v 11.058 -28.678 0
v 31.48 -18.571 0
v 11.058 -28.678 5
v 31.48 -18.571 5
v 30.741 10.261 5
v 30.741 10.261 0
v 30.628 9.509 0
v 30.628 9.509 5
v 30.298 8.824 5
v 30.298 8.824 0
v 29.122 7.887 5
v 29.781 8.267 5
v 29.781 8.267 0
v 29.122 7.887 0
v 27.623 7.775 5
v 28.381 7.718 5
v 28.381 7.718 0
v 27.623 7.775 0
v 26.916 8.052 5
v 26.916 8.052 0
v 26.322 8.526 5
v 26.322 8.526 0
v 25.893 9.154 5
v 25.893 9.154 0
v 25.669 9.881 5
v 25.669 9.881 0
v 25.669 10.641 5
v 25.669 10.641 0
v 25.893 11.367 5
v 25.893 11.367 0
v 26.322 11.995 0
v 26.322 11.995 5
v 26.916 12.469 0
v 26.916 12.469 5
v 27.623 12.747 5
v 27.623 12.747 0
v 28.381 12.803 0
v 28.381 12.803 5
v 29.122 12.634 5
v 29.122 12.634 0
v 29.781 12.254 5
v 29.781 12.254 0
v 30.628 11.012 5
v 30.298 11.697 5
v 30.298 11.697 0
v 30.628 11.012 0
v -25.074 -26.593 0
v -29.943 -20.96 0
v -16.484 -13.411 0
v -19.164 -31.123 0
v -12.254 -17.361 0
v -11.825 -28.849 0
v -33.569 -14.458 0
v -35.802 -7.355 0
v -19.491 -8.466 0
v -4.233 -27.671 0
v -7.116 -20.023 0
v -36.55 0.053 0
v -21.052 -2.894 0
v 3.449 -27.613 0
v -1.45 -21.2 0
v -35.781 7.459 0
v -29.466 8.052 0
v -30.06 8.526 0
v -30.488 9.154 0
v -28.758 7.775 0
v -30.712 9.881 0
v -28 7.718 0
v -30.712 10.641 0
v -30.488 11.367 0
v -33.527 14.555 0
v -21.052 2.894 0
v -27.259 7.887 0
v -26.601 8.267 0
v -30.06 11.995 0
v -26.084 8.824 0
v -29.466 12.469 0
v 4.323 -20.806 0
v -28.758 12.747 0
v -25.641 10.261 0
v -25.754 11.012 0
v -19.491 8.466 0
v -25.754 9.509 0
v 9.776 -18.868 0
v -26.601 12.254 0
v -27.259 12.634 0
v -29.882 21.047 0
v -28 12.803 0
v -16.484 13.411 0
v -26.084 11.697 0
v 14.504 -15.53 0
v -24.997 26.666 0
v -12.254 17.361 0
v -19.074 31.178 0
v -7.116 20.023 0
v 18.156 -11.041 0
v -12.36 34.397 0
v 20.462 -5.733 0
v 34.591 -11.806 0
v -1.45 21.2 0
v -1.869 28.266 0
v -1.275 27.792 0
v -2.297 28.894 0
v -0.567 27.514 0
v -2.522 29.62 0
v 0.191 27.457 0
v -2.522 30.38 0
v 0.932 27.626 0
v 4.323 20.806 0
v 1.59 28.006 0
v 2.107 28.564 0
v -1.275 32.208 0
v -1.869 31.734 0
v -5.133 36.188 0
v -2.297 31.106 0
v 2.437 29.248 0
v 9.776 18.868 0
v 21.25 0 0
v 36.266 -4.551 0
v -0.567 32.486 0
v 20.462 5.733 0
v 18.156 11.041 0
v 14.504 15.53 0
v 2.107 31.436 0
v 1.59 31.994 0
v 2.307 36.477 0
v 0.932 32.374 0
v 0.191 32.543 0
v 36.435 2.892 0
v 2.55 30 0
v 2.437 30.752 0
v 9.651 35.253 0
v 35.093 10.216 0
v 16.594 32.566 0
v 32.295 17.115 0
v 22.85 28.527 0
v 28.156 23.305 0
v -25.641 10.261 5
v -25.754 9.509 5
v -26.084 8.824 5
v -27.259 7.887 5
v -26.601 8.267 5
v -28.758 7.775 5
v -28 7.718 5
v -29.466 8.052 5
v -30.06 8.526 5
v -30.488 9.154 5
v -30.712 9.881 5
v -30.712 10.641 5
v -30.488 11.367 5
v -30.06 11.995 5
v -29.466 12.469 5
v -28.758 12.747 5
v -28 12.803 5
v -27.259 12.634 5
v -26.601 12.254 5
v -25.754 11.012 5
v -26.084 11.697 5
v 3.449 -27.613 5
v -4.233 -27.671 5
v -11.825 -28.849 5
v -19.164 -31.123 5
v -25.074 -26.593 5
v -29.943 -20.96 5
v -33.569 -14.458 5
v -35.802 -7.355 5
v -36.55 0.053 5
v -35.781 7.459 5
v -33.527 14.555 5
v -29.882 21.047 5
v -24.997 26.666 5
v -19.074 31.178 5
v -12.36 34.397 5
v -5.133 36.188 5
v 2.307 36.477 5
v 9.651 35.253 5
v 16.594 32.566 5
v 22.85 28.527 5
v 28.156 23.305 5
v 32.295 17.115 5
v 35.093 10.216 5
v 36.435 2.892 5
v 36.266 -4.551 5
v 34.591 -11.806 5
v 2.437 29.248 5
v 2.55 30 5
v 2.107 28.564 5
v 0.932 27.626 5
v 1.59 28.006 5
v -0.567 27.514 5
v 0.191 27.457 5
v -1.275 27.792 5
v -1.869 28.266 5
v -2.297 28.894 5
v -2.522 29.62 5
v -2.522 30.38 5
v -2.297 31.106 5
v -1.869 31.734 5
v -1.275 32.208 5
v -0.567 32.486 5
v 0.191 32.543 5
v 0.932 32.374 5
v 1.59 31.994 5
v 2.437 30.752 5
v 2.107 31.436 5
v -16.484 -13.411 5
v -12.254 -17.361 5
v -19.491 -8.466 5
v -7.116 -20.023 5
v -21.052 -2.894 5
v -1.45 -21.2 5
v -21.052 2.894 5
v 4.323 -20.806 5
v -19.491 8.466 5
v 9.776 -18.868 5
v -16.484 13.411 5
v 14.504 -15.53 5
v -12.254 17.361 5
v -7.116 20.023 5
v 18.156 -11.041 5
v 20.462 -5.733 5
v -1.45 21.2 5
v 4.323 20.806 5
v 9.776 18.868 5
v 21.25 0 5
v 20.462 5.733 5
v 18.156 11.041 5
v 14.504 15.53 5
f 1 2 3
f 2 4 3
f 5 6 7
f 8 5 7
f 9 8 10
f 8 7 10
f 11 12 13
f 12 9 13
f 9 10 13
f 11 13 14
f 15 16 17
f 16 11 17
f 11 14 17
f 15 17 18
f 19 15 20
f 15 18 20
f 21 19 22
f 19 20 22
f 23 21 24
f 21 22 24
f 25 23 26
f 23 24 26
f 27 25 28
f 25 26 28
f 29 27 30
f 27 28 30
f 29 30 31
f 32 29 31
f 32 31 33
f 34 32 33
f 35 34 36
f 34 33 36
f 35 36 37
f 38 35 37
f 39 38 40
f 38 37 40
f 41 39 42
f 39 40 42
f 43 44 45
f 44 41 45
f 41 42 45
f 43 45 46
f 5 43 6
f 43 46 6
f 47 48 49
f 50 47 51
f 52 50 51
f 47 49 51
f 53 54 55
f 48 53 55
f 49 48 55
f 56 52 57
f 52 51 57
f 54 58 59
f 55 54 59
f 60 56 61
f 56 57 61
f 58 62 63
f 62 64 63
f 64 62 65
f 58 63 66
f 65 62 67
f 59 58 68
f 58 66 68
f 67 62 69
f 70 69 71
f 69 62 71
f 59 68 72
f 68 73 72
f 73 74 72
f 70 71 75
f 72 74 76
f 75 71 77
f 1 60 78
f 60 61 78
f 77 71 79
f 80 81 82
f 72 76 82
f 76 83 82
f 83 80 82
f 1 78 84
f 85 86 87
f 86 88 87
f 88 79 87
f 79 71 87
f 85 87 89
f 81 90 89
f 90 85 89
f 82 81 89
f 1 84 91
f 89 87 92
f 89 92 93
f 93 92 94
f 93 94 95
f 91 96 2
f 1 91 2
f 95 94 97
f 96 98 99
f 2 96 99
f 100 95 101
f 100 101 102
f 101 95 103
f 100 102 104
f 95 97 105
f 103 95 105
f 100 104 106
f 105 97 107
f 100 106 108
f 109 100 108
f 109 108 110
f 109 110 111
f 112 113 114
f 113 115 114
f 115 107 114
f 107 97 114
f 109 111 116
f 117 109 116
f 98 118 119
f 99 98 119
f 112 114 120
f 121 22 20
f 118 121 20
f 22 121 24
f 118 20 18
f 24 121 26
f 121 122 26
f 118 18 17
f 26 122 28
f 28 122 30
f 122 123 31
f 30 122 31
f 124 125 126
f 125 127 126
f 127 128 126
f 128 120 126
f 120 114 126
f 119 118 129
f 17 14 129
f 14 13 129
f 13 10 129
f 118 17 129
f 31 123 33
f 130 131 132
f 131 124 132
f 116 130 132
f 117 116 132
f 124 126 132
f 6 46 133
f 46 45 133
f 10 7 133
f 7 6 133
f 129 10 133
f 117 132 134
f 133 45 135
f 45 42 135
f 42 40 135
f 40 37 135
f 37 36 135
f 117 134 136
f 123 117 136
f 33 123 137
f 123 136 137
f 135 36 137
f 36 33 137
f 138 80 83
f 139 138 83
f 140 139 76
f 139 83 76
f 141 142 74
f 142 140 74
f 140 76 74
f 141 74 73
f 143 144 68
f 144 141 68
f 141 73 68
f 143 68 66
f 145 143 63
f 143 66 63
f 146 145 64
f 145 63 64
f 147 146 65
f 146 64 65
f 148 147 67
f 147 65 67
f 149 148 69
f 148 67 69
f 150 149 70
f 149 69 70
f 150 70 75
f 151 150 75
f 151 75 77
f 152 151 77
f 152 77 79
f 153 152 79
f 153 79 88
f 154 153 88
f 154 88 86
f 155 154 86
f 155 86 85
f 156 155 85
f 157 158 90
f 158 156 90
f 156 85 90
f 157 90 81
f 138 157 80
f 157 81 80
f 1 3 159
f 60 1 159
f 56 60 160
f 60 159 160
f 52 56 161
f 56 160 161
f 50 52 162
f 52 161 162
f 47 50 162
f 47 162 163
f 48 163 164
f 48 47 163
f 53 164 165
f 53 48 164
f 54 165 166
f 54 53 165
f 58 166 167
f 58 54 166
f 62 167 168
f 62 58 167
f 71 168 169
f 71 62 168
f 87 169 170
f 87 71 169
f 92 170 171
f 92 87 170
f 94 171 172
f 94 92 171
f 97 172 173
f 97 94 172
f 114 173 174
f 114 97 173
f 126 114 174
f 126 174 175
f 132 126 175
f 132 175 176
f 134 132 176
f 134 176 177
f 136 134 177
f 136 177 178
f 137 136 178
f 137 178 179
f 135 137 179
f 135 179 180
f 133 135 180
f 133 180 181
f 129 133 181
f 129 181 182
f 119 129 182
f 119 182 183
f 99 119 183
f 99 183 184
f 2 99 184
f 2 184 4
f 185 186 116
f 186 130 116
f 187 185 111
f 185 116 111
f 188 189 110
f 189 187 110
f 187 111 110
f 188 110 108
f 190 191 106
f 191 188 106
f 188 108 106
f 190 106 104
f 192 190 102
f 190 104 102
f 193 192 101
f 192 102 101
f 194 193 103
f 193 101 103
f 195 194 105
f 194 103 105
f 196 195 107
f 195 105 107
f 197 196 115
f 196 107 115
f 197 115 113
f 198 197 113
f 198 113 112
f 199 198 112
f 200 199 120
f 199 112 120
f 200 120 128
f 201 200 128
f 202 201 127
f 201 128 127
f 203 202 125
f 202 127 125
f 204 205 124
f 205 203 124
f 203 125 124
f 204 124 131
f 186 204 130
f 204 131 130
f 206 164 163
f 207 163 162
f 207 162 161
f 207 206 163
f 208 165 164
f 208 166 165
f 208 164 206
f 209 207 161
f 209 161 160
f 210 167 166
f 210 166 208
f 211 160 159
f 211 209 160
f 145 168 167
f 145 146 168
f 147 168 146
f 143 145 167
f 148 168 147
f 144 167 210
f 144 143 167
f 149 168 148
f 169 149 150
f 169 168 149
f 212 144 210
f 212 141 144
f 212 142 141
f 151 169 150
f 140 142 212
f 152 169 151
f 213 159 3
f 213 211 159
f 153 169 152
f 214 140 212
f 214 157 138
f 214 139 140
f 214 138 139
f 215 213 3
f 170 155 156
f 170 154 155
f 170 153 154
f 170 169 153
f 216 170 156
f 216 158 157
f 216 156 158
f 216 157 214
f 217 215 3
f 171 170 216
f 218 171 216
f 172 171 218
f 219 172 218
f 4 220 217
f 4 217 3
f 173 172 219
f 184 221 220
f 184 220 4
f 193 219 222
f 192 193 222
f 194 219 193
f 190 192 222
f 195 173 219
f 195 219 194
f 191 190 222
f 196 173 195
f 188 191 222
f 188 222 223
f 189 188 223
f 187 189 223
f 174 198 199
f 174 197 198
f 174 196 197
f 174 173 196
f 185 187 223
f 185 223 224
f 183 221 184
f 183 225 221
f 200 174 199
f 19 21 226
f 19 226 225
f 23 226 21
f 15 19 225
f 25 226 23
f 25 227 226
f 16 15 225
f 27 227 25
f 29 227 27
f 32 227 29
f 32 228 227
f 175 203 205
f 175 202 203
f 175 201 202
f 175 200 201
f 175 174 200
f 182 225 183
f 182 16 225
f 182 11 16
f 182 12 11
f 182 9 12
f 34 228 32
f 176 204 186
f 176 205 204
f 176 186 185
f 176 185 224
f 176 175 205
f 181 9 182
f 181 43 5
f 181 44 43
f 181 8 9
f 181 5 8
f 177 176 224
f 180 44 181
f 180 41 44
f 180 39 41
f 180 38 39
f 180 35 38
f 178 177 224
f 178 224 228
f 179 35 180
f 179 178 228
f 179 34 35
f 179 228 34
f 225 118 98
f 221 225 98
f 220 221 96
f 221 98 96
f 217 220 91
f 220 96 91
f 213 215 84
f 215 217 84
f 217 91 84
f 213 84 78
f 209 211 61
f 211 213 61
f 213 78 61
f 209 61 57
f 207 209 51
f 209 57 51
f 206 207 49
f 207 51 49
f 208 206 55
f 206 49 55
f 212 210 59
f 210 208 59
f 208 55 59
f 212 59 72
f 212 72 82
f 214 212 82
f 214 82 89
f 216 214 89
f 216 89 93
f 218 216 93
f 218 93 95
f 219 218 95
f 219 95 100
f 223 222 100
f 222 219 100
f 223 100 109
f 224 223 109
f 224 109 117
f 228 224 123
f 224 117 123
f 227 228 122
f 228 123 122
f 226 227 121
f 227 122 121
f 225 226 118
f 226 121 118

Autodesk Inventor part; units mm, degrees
ref_plane "YZ Plane" through (0, 0, 0) normal (1, 0, 0) x (0, 1, 0)
ref_plane "XZ Plane" through (0, 0, 0) normal (0, 1, 0) x (-1, 0, 0)
ref_plane "XY Plane" through (0, 0, 0) normal (0, 0, 1) x (1, 0, 0)
sketch "スケッチ1" plane through (0, 0, 0) normal (0, 0, 1) x (1, 0, 0)
  circle A0 centre (0, 0) radius 21.25
  circle A1 centre (0, 0) radius 36.55
  line L0 (0, 0) -> (-28.1908, 10.2606) construction
  line L1 (0, 0) -> (28.1908, 10.2606) construction
  line L2 (-39.5959, 0) -> (43.1917, 0) construction
  line L3 (0, 0) -> (0, 30) construction
  circle A2 centre (-28.1908, 10.2606) radius 2.55
  circle A3 centre (0, 30) radius 2.55
  circle A4 centre (28.1908, 10.2606) radius 2.55
  dimension "d0" = 73.1
  dimension "d1" = 42.5
  dimension "d2" = 30
  dimension "d3" = 30
  dimension "d4" = 20
  dimension "d5" = 20
  dimension "d6" = 30
  dimension "d7" = 5.1
  dimension "d8" = 5.1
  dimension "d9" = 5.1
extrude "押し出し1" add sketch "スケッチ1" along normal blind 5
sketch "スケッチ2" plane through (0, 0, 5) normal (0, 0, 1) x (1, 0, 0)
  line L0 (0, 0) -> (0, -80) construction
  circle A0 centre (0, -80) radius 52.5
  dimension "d12" = 80
  dimension "d16" = 105
extrude "押し出し2" cut sketch "スケッチ2" against normal blind 10
sketch "スケッチ3" plane through (0, 0, 5) normal (0, 0, 1) x (1, 0, 0)
  arc A0 (19.1643, -31.1228) -> (-19.1643, -31.1228) centre (0, 0) ccw projected
  line L0 (31.4805, -18.571) -> (8.7644, -29.8131)
  line L1 (8.7644, -29.8131) -> (11.2377, -39.3237)
  line L2 (11.2377, -39.3237) -> (35.6526, -33.4076)
  line L3 (35.6526, -33.4076) -> (31.4805, -18.571)
extrude "押し出し3" cut sketch "スケッチ3" against normal blind 10
properties part number "円 42.5mm" material "アルミニウム 6061"
